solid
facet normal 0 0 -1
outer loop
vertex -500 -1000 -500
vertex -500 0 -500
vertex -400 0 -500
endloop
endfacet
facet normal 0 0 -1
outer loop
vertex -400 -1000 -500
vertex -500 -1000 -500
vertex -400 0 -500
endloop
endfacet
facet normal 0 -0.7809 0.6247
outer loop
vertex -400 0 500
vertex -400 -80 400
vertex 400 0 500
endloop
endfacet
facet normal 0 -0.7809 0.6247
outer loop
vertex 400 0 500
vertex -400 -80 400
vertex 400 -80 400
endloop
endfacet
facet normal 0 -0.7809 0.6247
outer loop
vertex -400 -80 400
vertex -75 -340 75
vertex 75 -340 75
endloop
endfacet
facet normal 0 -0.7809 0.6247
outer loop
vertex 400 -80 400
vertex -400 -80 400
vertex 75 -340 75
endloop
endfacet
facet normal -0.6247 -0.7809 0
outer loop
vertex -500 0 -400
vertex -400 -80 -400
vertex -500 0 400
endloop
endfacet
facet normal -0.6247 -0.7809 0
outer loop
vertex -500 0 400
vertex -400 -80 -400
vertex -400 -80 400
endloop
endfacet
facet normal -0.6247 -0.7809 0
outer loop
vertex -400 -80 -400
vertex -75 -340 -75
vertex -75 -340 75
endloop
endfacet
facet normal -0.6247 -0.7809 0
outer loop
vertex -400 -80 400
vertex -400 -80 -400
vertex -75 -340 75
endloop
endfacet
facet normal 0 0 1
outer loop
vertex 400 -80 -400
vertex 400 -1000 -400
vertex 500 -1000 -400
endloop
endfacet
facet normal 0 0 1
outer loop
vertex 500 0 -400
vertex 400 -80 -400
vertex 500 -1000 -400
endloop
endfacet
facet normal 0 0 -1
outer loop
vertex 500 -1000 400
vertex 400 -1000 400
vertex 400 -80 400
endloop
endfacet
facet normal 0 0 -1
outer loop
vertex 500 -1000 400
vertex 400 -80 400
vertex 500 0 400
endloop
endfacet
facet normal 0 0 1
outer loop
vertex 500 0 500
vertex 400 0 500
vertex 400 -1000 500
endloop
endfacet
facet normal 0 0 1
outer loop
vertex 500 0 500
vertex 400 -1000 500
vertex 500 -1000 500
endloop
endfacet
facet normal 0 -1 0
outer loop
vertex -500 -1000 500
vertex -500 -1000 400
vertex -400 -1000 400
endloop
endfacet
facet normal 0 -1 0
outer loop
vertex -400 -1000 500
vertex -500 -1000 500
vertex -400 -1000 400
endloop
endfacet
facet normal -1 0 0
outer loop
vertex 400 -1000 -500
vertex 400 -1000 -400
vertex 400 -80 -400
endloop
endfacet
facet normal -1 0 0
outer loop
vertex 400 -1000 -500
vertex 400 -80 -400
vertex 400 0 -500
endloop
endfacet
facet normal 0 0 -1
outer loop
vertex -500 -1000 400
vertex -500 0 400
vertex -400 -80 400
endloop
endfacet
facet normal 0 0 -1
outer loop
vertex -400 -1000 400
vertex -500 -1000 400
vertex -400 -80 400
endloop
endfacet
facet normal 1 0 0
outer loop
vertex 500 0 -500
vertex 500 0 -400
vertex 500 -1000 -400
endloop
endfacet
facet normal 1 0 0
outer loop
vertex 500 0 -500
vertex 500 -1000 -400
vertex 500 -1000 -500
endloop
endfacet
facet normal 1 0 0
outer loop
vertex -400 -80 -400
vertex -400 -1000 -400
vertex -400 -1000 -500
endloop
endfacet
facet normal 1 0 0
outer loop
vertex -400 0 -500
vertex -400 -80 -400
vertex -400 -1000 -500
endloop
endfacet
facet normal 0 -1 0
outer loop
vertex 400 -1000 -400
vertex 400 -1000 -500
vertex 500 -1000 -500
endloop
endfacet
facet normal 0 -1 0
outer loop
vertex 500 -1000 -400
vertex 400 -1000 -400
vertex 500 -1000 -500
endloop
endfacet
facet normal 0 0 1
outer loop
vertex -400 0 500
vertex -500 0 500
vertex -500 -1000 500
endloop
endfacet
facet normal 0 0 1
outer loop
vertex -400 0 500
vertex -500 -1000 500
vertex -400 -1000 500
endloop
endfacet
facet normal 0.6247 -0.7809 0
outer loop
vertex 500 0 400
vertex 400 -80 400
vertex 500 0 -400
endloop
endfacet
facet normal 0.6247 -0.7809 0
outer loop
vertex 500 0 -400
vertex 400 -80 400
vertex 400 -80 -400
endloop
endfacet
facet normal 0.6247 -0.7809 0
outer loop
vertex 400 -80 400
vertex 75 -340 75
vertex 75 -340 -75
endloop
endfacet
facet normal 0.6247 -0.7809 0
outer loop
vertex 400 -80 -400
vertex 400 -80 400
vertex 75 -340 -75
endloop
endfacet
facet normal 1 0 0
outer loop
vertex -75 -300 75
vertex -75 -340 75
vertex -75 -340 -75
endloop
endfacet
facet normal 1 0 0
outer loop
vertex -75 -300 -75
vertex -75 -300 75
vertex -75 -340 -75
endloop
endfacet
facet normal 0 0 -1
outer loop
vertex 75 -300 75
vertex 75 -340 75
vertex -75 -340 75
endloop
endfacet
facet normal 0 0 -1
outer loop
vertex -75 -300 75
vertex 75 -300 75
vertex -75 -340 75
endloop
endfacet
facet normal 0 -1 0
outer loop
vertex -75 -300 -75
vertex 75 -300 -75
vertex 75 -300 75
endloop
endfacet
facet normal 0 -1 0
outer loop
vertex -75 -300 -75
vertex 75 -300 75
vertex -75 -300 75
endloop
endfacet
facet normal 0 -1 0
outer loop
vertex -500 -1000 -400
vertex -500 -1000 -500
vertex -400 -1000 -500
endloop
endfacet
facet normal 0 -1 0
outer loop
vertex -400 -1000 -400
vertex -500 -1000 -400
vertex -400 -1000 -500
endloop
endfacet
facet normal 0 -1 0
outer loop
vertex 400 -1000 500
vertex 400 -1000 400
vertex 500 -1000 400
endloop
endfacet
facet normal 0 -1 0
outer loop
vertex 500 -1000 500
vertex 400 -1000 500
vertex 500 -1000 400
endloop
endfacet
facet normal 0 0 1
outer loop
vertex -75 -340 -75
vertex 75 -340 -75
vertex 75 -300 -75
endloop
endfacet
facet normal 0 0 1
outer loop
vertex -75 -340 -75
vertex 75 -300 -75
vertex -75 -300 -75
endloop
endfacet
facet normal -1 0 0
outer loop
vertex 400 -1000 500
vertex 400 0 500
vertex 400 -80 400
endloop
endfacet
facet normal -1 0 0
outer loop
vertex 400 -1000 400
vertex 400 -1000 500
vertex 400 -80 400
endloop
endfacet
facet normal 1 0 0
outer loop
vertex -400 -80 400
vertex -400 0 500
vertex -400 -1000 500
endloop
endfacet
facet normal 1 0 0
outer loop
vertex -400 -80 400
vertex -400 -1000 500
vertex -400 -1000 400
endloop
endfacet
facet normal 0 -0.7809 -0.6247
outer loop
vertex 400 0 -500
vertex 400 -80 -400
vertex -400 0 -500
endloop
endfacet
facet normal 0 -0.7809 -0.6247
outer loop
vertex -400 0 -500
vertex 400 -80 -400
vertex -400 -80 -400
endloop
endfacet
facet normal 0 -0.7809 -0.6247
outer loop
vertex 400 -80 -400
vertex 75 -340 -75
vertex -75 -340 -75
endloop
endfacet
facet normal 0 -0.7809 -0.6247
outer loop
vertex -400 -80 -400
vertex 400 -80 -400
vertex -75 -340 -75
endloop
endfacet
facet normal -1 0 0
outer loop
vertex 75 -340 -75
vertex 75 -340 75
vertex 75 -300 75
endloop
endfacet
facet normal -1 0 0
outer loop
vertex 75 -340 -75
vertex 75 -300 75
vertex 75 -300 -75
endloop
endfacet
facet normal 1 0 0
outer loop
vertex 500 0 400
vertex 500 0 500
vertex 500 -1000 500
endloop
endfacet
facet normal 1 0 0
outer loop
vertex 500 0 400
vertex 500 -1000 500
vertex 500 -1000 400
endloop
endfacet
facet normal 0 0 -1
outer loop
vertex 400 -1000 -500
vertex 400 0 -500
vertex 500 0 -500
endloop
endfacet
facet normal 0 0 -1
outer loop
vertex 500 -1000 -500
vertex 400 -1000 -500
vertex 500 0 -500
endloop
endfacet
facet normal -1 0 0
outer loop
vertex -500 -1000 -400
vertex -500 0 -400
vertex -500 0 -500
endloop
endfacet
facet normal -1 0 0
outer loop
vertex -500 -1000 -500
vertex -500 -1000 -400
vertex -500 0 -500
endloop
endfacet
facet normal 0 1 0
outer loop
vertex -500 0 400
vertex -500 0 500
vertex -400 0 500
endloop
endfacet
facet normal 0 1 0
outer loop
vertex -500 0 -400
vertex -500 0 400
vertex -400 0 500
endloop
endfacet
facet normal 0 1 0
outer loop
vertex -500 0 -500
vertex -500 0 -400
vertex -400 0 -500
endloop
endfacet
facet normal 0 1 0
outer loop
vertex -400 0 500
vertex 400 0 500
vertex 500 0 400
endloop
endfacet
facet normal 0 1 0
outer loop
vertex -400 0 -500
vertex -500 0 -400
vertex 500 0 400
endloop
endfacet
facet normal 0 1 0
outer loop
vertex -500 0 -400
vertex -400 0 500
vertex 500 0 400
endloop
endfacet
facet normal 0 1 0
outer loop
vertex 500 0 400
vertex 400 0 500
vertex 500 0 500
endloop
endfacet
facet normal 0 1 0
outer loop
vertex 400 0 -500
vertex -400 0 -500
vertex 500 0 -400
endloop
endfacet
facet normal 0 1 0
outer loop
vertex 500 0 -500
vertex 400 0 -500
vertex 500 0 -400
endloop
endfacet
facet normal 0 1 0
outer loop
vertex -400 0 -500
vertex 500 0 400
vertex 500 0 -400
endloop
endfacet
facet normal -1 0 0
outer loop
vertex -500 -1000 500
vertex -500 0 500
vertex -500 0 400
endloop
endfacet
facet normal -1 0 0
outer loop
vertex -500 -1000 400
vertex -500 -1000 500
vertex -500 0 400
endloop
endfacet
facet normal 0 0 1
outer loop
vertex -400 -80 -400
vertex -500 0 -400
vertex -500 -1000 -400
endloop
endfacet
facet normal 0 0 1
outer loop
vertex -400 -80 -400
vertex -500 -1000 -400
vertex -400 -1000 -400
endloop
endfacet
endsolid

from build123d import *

# Parameters (mm, degrees)
SKETCH5_W           = 150
SKETCH5_H           = 150
CUT_EXTRUDE1_DEPTH  = 100
SKETCH6_W           = 100
SKETCH6_H           = 100
BOSS_EXTRUDE1_DEPTH = 1000


with BuildPart() as part:
    # Sketch1 → Loft1 section 0
    with BuildSketch(Plane(origin=(0, 0, 0), x_dir=(1, 0, 0), z_dir=(0, 1, 0)), mode=Mode.PRIVATE) as loft1_s0:
        with BuildLine():
            Line((-500, -500), (500, -500))
            Line((500, -500), (500, 500))
            Line((500, 500), (-500, 500))
            Line((-500, 500), (-500, -500))
        make_face()
    loft([loft1_s0.sketch, Vertex(0, -400, 0)])

    # Sketch5 → Cut-Extrude1 (cut)
    with BuildSketch(Plane(origin=(0, -400, 0), x_dir=(-1, 0, 0), z_dir=(0, -1, 0))):
        Rectangle(SKETCH5_W, SKETCH5_H)
    extrude(amount=-CUT_EXTRUDE1_DEPTH, mode=Mode.SUBTRACT)

    # Sketch6 → Boss-Extrude1 (add)
    with BuildSketch(Plane(origin=(0, 0, 0), x_dir=(1, 0, 0), z_dir=(0, 1, 0))):
        with Locations((-450, 450)):
            Rectangle(SKETCH6_W, SKETCH6_H)
        with Locations((450, 450)):
            Rectangle(SKETCH6_W, SKETCH6_H)
        with Locations((-450, -450)):
            Rectangle(SKETCH6_W, SKETCH6_H)
        with Locations((450, -450)):
            Rectangle(SKETCH6_W, SKETCH6_H)
    extrude(amount=-BOSS_EXTRUDE1_DEPTH)


solid = part.part
